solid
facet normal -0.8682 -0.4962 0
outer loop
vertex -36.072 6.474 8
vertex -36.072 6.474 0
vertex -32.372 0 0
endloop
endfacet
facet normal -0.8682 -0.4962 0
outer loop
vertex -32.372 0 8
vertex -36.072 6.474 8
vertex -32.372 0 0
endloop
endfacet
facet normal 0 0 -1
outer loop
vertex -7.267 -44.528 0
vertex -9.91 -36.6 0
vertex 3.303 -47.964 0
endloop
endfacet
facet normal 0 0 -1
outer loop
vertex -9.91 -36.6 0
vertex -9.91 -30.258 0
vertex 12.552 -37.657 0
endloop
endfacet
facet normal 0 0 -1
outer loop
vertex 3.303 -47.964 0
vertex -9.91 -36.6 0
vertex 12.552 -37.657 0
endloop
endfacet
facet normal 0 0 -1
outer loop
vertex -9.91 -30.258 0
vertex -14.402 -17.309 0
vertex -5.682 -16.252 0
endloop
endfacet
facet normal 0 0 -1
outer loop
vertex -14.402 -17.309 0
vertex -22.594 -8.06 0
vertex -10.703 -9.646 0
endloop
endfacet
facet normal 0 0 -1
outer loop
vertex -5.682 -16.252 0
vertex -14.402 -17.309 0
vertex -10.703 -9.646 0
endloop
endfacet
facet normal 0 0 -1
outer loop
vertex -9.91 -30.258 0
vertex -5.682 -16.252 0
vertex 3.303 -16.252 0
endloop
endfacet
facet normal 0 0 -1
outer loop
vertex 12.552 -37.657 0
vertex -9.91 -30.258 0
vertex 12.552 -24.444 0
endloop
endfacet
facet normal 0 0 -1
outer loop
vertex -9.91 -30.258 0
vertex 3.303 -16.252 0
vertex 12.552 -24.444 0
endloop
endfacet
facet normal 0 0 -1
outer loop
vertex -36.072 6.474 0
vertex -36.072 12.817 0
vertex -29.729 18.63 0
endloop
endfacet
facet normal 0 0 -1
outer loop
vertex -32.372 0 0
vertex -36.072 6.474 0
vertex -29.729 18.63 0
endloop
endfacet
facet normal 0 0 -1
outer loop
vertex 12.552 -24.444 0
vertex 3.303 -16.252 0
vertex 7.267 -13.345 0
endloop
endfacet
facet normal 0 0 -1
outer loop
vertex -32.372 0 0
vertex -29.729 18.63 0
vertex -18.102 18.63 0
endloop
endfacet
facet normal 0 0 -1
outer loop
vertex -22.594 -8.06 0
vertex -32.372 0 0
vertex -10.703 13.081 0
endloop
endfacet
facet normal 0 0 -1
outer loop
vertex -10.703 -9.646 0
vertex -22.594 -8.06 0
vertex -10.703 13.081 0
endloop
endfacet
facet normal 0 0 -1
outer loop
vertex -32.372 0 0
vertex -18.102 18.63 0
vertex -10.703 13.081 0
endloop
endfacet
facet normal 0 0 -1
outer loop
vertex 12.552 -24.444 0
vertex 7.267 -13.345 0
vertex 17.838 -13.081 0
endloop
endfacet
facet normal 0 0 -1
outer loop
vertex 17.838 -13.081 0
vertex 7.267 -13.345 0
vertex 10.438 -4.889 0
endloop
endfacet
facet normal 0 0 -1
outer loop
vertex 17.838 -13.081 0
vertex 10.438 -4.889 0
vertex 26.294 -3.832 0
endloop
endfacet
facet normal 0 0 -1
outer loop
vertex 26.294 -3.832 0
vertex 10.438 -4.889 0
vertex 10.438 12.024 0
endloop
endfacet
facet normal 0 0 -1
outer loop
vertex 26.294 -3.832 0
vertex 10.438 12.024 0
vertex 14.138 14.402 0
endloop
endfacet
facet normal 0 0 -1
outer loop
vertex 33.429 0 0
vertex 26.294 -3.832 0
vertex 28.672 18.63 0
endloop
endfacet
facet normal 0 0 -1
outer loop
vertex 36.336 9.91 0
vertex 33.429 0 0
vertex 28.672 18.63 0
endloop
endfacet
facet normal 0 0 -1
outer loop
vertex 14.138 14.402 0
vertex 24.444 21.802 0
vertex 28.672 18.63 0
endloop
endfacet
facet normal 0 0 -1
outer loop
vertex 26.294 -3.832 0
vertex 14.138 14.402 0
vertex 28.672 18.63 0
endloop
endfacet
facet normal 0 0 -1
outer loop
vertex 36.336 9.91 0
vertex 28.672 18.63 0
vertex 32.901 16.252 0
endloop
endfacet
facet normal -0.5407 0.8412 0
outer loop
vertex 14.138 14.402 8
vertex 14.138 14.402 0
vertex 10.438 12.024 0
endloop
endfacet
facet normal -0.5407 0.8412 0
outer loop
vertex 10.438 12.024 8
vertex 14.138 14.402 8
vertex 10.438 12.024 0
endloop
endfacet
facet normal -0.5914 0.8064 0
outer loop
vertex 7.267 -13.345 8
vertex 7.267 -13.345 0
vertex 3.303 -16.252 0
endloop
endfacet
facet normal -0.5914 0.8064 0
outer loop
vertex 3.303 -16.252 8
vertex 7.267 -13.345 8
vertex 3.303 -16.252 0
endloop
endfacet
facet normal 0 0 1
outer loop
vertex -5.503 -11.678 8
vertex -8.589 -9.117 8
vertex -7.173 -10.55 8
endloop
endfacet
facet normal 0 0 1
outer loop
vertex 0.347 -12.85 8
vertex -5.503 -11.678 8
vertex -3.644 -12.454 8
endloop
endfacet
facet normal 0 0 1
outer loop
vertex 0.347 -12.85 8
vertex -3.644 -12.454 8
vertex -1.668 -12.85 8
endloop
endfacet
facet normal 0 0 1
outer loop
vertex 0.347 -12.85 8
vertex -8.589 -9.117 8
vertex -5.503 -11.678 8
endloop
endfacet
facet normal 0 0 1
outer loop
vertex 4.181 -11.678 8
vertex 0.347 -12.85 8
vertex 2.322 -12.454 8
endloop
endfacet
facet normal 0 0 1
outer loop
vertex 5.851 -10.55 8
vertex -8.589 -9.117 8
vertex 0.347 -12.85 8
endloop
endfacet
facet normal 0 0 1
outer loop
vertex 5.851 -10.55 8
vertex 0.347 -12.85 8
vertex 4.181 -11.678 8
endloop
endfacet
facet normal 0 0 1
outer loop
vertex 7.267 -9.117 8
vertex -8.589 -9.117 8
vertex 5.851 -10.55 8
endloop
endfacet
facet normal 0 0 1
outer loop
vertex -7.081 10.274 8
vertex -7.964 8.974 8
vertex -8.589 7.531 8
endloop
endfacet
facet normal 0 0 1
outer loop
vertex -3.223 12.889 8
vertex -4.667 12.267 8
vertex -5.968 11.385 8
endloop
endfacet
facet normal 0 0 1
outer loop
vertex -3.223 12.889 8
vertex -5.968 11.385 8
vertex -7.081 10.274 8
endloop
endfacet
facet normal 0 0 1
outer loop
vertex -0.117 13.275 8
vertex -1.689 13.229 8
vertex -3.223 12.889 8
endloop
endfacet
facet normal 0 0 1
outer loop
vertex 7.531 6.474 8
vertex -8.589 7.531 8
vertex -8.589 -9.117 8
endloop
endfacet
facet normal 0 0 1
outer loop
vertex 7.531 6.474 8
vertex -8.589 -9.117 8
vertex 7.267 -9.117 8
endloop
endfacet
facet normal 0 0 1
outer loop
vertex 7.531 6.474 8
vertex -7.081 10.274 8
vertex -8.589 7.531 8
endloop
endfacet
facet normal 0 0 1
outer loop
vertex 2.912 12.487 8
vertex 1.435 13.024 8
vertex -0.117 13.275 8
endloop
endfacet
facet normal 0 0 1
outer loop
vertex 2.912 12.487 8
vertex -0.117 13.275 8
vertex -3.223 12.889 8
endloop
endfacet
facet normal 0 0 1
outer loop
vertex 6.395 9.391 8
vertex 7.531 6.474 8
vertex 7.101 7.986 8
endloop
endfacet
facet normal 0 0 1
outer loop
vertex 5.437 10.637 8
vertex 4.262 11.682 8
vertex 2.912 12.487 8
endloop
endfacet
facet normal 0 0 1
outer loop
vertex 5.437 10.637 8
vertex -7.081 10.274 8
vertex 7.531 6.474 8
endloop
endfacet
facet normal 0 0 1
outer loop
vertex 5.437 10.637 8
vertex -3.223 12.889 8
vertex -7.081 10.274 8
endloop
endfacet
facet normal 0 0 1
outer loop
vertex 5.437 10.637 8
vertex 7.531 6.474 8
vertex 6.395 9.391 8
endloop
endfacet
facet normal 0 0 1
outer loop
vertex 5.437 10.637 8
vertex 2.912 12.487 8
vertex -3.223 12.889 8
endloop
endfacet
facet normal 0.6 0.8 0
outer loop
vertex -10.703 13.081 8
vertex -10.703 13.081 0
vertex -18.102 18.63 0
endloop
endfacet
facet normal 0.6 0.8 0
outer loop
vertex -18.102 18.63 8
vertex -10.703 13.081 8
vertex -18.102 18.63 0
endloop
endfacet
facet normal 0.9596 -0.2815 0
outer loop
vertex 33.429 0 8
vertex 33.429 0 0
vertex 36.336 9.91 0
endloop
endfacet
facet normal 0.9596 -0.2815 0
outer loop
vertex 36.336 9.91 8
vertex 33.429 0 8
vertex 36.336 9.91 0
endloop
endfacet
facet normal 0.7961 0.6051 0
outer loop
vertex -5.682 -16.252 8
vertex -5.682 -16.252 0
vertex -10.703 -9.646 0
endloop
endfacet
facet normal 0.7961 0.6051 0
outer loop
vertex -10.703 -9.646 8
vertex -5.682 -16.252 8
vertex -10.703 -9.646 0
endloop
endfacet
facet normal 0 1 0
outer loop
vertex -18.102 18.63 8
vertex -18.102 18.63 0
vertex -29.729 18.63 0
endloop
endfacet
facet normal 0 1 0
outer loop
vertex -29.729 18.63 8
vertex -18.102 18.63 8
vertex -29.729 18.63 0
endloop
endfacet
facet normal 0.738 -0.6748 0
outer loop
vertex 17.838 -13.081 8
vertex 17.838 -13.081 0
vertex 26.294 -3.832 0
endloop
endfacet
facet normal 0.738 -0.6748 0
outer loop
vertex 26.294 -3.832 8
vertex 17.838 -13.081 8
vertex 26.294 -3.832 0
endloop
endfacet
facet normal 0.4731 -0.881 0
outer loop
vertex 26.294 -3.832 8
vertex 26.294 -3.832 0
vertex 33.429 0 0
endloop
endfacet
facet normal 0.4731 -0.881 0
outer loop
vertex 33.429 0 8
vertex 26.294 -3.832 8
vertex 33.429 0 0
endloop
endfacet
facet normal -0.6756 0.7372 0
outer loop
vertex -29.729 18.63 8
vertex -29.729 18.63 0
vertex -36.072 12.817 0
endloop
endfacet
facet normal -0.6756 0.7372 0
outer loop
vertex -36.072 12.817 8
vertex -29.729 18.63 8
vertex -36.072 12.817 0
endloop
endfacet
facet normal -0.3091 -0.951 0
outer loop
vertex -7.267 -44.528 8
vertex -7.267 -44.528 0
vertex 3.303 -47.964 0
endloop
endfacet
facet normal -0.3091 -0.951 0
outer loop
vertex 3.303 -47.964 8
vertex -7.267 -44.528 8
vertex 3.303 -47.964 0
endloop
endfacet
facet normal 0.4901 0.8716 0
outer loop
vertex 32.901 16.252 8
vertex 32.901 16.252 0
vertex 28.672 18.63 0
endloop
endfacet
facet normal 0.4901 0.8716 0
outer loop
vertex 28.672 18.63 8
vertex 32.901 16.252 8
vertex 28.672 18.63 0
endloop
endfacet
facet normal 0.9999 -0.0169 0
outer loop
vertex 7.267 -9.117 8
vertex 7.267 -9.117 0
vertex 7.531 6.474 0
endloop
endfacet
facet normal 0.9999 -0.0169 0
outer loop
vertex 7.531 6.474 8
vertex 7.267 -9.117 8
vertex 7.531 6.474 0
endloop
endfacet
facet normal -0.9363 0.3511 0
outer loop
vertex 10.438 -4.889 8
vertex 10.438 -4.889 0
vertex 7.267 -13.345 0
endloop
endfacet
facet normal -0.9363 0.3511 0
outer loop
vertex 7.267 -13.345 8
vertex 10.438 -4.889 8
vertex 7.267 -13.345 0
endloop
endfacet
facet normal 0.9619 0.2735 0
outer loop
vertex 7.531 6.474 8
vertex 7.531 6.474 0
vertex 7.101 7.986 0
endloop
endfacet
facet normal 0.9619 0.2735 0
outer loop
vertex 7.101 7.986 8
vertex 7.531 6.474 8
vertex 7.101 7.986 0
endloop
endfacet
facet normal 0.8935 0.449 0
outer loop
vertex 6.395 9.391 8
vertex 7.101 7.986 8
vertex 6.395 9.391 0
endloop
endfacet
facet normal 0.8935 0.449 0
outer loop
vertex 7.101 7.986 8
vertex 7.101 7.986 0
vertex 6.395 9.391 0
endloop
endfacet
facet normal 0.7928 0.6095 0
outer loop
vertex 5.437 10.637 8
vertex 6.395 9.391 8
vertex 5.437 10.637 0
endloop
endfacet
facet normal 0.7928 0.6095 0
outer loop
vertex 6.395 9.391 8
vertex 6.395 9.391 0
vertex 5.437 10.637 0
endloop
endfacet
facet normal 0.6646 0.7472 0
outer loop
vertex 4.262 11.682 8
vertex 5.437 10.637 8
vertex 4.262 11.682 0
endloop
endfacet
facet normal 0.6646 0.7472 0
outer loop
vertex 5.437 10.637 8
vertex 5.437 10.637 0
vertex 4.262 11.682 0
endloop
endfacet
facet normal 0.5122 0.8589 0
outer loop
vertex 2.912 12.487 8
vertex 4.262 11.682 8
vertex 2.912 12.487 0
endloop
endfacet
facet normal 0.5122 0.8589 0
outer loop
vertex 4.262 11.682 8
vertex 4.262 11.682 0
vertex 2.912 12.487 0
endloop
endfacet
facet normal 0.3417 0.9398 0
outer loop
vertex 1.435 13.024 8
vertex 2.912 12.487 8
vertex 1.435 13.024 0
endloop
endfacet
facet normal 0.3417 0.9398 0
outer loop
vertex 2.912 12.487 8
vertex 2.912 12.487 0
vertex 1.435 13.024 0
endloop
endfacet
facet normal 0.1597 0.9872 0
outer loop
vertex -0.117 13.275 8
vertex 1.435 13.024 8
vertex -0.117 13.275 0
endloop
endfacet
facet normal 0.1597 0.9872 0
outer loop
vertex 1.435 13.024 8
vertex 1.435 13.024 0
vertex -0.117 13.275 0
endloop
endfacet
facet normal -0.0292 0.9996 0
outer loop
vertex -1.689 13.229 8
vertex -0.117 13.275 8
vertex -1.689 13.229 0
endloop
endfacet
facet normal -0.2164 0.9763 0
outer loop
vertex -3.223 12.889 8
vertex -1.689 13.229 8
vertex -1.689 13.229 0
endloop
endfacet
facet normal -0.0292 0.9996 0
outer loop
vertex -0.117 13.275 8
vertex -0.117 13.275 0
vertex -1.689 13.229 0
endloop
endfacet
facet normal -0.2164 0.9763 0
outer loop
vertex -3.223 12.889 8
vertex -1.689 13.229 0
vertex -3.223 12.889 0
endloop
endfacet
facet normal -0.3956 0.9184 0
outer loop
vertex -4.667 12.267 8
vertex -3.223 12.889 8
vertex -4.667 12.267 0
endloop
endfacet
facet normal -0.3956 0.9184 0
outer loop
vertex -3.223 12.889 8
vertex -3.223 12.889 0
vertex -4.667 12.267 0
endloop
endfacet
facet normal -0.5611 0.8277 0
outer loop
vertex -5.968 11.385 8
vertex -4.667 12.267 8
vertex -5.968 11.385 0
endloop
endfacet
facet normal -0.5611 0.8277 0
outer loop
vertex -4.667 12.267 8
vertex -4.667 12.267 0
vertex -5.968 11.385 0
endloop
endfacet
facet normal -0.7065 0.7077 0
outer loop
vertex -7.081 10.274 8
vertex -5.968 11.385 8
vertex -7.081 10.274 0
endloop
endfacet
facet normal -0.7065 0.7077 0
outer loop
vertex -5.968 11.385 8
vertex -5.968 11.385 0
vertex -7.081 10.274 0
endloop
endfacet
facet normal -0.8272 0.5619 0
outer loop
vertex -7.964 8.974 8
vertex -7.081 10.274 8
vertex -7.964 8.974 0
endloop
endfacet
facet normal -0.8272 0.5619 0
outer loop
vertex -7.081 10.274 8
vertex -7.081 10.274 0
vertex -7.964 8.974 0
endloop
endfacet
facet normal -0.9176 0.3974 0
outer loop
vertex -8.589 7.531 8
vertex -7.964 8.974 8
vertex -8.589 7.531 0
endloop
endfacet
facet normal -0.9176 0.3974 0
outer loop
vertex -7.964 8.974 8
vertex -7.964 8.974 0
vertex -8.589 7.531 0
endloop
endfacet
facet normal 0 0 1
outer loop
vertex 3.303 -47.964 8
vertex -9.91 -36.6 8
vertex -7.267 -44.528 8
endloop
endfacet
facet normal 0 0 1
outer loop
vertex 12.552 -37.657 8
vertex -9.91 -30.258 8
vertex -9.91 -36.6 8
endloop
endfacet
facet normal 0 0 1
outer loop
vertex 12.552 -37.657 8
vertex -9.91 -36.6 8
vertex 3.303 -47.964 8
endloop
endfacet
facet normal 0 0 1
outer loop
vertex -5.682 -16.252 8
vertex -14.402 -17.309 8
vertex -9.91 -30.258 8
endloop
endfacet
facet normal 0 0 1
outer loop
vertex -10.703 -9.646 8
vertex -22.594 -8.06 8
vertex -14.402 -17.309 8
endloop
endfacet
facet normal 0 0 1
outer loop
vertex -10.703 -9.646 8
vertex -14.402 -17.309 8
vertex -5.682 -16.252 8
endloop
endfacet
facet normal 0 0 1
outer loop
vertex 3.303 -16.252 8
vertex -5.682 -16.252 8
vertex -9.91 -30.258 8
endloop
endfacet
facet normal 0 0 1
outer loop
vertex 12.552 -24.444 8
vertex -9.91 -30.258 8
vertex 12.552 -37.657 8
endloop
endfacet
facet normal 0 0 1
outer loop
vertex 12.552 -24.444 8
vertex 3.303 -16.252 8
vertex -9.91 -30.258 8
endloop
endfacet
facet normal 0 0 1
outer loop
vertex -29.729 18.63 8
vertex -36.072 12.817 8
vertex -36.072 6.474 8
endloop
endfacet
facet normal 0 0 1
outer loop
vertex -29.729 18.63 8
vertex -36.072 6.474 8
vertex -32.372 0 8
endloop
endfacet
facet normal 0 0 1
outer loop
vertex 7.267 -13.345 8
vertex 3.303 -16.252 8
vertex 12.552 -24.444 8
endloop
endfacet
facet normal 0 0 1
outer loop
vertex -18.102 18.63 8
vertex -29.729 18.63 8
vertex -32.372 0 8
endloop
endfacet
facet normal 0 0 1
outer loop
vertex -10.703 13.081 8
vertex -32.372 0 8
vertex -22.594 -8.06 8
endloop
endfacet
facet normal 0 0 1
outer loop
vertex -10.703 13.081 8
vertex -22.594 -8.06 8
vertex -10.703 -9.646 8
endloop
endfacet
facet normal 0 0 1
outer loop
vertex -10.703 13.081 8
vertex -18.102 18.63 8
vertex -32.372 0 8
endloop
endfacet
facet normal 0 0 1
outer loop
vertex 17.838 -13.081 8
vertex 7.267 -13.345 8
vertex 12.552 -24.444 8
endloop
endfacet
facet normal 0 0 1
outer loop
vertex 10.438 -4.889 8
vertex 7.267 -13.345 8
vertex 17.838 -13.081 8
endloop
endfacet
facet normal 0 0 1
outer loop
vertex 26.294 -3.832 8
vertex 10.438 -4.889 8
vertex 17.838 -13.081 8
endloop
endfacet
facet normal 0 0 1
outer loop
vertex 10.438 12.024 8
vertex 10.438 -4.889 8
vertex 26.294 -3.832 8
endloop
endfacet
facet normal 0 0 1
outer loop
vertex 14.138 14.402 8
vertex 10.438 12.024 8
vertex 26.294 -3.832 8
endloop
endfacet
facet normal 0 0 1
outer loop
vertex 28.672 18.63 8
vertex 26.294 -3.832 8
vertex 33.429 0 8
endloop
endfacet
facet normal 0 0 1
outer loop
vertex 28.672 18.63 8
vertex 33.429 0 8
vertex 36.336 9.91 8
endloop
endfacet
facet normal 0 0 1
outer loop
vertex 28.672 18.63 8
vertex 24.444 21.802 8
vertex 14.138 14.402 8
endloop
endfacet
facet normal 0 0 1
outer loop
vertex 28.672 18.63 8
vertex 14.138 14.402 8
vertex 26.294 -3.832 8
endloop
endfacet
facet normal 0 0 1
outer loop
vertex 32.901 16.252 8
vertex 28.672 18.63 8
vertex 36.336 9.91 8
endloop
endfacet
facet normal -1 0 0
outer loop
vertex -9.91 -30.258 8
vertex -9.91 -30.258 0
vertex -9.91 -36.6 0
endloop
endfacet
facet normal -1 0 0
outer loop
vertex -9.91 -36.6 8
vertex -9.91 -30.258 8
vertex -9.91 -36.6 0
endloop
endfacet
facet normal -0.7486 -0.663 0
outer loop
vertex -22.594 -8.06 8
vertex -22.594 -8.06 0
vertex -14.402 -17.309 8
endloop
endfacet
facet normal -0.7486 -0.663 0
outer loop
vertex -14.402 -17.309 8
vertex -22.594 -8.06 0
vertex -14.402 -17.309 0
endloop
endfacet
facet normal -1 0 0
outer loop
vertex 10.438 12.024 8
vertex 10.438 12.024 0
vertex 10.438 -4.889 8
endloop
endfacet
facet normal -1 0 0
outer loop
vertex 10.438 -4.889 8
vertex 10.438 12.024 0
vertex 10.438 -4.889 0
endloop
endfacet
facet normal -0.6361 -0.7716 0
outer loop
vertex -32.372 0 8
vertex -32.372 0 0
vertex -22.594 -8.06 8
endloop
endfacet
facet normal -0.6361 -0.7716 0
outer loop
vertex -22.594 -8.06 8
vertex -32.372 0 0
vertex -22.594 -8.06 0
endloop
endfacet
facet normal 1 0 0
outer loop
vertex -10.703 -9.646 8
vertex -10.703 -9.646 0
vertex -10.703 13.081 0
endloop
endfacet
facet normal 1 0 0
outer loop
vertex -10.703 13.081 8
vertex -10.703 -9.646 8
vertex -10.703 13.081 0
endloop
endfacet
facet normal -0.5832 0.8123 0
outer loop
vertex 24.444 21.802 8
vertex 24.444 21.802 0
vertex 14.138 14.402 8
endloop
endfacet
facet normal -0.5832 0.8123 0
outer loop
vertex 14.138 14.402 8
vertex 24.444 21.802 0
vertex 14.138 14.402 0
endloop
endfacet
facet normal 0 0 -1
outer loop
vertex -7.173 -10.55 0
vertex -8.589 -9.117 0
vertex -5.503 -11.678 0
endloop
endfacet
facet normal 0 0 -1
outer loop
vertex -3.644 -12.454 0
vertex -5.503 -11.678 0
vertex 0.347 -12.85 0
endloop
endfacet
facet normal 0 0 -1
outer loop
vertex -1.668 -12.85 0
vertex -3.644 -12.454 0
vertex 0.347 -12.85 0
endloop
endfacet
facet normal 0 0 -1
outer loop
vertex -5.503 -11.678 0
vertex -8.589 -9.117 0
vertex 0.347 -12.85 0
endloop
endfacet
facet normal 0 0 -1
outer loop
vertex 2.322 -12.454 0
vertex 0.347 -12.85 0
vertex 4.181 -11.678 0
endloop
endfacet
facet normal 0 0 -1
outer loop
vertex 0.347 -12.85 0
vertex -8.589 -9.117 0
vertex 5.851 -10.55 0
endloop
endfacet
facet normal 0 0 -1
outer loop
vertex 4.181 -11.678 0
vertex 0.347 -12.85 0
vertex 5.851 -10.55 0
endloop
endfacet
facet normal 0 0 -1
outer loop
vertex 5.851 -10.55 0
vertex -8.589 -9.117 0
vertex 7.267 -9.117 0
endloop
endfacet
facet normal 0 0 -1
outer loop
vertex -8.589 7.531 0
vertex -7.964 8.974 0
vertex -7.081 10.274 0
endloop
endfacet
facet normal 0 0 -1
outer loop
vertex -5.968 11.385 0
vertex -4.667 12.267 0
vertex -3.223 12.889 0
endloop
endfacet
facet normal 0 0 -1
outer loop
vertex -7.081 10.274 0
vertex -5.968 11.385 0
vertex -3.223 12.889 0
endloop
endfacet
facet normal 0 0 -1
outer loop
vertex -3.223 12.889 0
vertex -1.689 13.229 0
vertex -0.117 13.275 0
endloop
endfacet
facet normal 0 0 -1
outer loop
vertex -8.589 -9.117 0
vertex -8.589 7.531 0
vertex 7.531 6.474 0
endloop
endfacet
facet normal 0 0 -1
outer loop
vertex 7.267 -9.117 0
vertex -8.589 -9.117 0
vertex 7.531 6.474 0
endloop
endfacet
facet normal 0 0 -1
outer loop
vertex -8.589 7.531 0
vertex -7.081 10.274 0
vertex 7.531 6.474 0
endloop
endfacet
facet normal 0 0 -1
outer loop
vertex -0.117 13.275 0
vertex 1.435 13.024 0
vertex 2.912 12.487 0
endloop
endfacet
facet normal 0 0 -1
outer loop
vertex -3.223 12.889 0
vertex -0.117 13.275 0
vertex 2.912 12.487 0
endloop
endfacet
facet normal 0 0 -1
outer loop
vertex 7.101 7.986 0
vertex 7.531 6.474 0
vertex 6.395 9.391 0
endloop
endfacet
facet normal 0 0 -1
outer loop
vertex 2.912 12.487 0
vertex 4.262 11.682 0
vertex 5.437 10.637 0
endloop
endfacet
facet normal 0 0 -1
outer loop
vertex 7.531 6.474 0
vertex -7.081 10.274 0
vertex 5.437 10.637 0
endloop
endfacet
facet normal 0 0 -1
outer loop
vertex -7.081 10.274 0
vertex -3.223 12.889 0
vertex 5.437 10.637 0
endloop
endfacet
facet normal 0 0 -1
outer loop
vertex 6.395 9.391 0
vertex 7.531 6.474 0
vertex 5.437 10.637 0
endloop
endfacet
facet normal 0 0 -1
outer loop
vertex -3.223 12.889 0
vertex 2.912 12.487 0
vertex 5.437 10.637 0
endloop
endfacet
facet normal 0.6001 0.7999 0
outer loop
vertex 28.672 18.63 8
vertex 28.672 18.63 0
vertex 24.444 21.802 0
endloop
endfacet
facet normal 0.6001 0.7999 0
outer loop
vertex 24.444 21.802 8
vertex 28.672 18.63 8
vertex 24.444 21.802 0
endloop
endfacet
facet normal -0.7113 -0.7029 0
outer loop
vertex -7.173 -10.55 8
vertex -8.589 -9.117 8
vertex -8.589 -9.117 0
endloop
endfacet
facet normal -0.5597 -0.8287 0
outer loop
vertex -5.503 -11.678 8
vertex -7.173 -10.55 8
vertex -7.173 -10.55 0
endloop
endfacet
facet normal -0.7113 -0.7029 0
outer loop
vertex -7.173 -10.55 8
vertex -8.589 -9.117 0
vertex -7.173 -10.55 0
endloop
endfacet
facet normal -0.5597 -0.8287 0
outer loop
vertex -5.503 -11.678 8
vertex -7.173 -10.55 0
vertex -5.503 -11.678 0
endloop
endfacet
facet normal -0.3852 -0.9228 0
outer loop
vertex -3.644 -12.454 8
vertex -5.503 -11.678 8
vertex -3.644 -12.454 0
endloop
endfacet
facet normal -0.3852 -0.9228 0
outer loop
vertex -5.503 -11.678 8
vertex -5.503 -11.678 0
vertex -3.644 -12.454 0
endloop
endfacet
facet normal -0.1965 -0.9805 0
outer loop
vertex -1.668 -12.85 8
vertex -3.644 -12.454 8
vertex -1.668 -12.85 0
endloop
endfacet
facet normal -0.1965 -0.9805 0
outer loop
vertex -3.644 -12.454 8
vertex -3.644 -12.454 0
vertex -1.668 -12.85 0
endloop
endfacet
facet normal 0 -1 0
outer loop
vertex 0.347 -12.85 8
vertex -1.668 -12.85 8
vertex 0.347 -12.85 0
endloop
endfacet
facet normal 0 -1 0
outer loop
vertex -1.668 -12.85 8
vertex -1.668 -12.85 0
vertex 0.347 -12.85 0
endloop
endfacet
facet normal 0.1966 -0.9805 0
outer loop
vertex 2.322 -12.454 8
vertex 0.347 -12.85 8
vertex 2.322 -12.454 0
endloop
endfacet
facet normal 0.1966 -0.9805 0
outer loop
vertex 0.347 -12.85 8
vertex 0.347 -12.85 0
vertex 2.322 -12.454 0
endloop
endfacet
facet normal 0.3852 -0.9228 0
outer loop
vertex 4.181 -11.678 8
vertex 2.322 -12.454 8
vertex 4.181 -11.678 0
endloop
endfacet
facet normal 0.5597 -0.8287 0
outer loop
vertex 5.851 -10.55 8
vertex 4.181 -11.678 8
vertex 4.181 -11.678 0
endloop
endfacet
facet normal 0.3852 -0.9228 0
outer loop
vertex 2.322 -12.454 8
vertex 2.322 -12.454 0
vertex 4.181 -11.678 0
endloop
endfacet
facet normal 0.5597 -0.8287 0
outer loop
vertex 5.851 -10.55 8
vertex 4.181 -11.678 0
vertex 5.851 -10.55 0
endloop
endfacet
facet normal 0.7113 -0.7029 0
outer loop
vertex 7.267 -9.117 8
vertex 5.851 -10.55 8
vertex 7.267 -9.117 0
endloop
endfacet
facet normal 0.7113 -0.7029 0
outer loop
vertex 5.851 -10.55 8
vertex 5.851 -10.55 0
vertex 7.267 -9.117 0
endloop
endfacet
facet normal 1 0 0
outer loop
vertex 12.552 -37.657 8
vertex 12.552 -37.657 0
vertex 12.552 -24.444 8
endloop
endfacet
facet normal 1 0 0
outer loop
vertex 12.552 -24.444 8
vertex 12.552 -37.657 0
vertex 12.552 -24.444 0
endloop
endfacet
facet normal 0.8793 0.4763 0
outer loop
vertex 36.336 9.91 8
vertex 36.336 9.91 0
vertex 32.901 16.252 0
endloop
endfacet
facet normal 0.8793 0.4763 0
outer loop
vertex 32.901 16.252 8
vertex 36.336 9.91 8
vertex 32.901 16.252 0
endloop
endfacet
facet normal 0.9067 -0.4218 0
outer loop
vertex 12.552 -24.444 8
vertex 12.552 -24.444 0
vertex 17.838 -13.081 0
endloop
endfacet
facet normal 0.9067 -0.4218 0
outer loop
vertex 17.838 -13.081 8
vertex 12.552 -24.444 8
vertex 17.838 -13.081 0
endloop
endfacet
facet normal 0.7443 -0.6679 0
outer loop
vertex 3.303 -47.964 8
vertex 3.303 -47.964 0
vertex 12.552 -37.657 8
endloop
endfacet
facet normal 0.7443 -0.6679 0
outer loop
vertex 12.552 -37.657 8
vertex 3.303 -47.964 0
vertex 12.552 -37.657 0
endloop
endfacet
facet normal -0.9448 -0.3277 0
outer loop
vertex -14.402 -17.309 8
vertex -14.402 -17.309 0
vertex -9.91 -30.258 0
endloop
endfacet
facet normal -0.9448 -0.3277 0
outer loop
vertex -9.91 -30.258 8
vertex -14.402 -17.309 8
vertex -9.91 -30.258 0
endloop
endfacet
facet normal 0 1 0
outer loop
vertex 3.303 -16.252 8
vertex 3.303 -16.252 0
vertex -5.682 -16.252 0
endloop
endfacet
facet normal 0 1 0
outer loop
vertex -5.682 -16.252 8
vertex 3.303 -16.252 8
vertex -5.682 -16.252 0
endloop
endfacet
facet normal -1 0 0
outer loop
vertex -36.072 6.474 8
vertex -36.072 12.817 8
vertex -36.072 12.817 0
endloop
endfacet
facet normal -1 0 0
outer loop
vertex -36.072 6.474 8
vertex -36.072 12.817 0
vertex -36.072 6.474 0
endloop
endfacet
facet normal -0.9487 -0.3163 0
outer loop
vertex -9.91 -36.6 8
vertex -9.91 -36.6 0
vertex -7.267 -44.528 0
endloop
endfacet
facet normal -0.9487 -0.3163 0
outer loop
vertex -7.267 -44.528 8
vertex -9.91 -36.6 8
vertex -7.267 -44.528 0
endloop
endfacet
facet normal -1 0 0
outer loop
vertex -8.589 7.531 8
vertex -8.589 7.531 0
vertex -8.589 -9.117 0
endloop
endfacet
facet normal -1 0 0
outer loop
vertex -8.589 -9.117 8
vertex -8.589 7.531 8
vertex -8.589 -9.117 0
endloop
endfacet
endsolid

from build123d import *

# Parameters (mm, degrees)
F1_DEPTH = 8


with BuildPart() as f1:
    # F0 (on Top) → F1 (new body)
    with BuildSketch(Plane.XY):
        Polygon((-10.702601, -9.645554), (-10.702601, 13.080957), (-18.101931, 18.630454), (-24.972735, 18.630454), (-29.729448, 18.630454), (-36.071729, 12.816695), (-36.071729, 6.474413), (-32.372065, 0), (-22.594379, -8.059983), (-14.402266, -17.309144), (-9.909816, -30.257972), (-9.909816, -36.600254), (-7.267199, -44.528104), (3.303273, -47.963507), (12.552432, -37.657302), (12.552432, -24.444213), (17.837668, -13.080957), (26.294043, -3.831795), (33.429112, 0), (36.335994, 9.909815), (32.90059, 16.252099), (28.672399, 18.630454), (24.444211, 21.801595), (14.138005, 14.402266), (10.438339, 12.02391), (10.438339, -4.888842), (7.267199, -13.345218), (3.303273, -16.252099), (-5.681627, -16.252099), align=None)
        with BuildLine():
            Line((7.267199, -9.11703), (7.53146, 6.474413))
            ThreePointArc((7.53146, 6.474413), (-0.117271, 13.274531), (-8.588507, 7.53146))
            Line((-8.588507, 7.53146), (-8.588507, -9.11703))
            ThreePointArc((-8.588507, -9.11703), (-0.660654, -12.900263), (7.267199, -9.11703))
        make_face()
    extrude(amount=F1_DEPTH)


solid = f1.part
